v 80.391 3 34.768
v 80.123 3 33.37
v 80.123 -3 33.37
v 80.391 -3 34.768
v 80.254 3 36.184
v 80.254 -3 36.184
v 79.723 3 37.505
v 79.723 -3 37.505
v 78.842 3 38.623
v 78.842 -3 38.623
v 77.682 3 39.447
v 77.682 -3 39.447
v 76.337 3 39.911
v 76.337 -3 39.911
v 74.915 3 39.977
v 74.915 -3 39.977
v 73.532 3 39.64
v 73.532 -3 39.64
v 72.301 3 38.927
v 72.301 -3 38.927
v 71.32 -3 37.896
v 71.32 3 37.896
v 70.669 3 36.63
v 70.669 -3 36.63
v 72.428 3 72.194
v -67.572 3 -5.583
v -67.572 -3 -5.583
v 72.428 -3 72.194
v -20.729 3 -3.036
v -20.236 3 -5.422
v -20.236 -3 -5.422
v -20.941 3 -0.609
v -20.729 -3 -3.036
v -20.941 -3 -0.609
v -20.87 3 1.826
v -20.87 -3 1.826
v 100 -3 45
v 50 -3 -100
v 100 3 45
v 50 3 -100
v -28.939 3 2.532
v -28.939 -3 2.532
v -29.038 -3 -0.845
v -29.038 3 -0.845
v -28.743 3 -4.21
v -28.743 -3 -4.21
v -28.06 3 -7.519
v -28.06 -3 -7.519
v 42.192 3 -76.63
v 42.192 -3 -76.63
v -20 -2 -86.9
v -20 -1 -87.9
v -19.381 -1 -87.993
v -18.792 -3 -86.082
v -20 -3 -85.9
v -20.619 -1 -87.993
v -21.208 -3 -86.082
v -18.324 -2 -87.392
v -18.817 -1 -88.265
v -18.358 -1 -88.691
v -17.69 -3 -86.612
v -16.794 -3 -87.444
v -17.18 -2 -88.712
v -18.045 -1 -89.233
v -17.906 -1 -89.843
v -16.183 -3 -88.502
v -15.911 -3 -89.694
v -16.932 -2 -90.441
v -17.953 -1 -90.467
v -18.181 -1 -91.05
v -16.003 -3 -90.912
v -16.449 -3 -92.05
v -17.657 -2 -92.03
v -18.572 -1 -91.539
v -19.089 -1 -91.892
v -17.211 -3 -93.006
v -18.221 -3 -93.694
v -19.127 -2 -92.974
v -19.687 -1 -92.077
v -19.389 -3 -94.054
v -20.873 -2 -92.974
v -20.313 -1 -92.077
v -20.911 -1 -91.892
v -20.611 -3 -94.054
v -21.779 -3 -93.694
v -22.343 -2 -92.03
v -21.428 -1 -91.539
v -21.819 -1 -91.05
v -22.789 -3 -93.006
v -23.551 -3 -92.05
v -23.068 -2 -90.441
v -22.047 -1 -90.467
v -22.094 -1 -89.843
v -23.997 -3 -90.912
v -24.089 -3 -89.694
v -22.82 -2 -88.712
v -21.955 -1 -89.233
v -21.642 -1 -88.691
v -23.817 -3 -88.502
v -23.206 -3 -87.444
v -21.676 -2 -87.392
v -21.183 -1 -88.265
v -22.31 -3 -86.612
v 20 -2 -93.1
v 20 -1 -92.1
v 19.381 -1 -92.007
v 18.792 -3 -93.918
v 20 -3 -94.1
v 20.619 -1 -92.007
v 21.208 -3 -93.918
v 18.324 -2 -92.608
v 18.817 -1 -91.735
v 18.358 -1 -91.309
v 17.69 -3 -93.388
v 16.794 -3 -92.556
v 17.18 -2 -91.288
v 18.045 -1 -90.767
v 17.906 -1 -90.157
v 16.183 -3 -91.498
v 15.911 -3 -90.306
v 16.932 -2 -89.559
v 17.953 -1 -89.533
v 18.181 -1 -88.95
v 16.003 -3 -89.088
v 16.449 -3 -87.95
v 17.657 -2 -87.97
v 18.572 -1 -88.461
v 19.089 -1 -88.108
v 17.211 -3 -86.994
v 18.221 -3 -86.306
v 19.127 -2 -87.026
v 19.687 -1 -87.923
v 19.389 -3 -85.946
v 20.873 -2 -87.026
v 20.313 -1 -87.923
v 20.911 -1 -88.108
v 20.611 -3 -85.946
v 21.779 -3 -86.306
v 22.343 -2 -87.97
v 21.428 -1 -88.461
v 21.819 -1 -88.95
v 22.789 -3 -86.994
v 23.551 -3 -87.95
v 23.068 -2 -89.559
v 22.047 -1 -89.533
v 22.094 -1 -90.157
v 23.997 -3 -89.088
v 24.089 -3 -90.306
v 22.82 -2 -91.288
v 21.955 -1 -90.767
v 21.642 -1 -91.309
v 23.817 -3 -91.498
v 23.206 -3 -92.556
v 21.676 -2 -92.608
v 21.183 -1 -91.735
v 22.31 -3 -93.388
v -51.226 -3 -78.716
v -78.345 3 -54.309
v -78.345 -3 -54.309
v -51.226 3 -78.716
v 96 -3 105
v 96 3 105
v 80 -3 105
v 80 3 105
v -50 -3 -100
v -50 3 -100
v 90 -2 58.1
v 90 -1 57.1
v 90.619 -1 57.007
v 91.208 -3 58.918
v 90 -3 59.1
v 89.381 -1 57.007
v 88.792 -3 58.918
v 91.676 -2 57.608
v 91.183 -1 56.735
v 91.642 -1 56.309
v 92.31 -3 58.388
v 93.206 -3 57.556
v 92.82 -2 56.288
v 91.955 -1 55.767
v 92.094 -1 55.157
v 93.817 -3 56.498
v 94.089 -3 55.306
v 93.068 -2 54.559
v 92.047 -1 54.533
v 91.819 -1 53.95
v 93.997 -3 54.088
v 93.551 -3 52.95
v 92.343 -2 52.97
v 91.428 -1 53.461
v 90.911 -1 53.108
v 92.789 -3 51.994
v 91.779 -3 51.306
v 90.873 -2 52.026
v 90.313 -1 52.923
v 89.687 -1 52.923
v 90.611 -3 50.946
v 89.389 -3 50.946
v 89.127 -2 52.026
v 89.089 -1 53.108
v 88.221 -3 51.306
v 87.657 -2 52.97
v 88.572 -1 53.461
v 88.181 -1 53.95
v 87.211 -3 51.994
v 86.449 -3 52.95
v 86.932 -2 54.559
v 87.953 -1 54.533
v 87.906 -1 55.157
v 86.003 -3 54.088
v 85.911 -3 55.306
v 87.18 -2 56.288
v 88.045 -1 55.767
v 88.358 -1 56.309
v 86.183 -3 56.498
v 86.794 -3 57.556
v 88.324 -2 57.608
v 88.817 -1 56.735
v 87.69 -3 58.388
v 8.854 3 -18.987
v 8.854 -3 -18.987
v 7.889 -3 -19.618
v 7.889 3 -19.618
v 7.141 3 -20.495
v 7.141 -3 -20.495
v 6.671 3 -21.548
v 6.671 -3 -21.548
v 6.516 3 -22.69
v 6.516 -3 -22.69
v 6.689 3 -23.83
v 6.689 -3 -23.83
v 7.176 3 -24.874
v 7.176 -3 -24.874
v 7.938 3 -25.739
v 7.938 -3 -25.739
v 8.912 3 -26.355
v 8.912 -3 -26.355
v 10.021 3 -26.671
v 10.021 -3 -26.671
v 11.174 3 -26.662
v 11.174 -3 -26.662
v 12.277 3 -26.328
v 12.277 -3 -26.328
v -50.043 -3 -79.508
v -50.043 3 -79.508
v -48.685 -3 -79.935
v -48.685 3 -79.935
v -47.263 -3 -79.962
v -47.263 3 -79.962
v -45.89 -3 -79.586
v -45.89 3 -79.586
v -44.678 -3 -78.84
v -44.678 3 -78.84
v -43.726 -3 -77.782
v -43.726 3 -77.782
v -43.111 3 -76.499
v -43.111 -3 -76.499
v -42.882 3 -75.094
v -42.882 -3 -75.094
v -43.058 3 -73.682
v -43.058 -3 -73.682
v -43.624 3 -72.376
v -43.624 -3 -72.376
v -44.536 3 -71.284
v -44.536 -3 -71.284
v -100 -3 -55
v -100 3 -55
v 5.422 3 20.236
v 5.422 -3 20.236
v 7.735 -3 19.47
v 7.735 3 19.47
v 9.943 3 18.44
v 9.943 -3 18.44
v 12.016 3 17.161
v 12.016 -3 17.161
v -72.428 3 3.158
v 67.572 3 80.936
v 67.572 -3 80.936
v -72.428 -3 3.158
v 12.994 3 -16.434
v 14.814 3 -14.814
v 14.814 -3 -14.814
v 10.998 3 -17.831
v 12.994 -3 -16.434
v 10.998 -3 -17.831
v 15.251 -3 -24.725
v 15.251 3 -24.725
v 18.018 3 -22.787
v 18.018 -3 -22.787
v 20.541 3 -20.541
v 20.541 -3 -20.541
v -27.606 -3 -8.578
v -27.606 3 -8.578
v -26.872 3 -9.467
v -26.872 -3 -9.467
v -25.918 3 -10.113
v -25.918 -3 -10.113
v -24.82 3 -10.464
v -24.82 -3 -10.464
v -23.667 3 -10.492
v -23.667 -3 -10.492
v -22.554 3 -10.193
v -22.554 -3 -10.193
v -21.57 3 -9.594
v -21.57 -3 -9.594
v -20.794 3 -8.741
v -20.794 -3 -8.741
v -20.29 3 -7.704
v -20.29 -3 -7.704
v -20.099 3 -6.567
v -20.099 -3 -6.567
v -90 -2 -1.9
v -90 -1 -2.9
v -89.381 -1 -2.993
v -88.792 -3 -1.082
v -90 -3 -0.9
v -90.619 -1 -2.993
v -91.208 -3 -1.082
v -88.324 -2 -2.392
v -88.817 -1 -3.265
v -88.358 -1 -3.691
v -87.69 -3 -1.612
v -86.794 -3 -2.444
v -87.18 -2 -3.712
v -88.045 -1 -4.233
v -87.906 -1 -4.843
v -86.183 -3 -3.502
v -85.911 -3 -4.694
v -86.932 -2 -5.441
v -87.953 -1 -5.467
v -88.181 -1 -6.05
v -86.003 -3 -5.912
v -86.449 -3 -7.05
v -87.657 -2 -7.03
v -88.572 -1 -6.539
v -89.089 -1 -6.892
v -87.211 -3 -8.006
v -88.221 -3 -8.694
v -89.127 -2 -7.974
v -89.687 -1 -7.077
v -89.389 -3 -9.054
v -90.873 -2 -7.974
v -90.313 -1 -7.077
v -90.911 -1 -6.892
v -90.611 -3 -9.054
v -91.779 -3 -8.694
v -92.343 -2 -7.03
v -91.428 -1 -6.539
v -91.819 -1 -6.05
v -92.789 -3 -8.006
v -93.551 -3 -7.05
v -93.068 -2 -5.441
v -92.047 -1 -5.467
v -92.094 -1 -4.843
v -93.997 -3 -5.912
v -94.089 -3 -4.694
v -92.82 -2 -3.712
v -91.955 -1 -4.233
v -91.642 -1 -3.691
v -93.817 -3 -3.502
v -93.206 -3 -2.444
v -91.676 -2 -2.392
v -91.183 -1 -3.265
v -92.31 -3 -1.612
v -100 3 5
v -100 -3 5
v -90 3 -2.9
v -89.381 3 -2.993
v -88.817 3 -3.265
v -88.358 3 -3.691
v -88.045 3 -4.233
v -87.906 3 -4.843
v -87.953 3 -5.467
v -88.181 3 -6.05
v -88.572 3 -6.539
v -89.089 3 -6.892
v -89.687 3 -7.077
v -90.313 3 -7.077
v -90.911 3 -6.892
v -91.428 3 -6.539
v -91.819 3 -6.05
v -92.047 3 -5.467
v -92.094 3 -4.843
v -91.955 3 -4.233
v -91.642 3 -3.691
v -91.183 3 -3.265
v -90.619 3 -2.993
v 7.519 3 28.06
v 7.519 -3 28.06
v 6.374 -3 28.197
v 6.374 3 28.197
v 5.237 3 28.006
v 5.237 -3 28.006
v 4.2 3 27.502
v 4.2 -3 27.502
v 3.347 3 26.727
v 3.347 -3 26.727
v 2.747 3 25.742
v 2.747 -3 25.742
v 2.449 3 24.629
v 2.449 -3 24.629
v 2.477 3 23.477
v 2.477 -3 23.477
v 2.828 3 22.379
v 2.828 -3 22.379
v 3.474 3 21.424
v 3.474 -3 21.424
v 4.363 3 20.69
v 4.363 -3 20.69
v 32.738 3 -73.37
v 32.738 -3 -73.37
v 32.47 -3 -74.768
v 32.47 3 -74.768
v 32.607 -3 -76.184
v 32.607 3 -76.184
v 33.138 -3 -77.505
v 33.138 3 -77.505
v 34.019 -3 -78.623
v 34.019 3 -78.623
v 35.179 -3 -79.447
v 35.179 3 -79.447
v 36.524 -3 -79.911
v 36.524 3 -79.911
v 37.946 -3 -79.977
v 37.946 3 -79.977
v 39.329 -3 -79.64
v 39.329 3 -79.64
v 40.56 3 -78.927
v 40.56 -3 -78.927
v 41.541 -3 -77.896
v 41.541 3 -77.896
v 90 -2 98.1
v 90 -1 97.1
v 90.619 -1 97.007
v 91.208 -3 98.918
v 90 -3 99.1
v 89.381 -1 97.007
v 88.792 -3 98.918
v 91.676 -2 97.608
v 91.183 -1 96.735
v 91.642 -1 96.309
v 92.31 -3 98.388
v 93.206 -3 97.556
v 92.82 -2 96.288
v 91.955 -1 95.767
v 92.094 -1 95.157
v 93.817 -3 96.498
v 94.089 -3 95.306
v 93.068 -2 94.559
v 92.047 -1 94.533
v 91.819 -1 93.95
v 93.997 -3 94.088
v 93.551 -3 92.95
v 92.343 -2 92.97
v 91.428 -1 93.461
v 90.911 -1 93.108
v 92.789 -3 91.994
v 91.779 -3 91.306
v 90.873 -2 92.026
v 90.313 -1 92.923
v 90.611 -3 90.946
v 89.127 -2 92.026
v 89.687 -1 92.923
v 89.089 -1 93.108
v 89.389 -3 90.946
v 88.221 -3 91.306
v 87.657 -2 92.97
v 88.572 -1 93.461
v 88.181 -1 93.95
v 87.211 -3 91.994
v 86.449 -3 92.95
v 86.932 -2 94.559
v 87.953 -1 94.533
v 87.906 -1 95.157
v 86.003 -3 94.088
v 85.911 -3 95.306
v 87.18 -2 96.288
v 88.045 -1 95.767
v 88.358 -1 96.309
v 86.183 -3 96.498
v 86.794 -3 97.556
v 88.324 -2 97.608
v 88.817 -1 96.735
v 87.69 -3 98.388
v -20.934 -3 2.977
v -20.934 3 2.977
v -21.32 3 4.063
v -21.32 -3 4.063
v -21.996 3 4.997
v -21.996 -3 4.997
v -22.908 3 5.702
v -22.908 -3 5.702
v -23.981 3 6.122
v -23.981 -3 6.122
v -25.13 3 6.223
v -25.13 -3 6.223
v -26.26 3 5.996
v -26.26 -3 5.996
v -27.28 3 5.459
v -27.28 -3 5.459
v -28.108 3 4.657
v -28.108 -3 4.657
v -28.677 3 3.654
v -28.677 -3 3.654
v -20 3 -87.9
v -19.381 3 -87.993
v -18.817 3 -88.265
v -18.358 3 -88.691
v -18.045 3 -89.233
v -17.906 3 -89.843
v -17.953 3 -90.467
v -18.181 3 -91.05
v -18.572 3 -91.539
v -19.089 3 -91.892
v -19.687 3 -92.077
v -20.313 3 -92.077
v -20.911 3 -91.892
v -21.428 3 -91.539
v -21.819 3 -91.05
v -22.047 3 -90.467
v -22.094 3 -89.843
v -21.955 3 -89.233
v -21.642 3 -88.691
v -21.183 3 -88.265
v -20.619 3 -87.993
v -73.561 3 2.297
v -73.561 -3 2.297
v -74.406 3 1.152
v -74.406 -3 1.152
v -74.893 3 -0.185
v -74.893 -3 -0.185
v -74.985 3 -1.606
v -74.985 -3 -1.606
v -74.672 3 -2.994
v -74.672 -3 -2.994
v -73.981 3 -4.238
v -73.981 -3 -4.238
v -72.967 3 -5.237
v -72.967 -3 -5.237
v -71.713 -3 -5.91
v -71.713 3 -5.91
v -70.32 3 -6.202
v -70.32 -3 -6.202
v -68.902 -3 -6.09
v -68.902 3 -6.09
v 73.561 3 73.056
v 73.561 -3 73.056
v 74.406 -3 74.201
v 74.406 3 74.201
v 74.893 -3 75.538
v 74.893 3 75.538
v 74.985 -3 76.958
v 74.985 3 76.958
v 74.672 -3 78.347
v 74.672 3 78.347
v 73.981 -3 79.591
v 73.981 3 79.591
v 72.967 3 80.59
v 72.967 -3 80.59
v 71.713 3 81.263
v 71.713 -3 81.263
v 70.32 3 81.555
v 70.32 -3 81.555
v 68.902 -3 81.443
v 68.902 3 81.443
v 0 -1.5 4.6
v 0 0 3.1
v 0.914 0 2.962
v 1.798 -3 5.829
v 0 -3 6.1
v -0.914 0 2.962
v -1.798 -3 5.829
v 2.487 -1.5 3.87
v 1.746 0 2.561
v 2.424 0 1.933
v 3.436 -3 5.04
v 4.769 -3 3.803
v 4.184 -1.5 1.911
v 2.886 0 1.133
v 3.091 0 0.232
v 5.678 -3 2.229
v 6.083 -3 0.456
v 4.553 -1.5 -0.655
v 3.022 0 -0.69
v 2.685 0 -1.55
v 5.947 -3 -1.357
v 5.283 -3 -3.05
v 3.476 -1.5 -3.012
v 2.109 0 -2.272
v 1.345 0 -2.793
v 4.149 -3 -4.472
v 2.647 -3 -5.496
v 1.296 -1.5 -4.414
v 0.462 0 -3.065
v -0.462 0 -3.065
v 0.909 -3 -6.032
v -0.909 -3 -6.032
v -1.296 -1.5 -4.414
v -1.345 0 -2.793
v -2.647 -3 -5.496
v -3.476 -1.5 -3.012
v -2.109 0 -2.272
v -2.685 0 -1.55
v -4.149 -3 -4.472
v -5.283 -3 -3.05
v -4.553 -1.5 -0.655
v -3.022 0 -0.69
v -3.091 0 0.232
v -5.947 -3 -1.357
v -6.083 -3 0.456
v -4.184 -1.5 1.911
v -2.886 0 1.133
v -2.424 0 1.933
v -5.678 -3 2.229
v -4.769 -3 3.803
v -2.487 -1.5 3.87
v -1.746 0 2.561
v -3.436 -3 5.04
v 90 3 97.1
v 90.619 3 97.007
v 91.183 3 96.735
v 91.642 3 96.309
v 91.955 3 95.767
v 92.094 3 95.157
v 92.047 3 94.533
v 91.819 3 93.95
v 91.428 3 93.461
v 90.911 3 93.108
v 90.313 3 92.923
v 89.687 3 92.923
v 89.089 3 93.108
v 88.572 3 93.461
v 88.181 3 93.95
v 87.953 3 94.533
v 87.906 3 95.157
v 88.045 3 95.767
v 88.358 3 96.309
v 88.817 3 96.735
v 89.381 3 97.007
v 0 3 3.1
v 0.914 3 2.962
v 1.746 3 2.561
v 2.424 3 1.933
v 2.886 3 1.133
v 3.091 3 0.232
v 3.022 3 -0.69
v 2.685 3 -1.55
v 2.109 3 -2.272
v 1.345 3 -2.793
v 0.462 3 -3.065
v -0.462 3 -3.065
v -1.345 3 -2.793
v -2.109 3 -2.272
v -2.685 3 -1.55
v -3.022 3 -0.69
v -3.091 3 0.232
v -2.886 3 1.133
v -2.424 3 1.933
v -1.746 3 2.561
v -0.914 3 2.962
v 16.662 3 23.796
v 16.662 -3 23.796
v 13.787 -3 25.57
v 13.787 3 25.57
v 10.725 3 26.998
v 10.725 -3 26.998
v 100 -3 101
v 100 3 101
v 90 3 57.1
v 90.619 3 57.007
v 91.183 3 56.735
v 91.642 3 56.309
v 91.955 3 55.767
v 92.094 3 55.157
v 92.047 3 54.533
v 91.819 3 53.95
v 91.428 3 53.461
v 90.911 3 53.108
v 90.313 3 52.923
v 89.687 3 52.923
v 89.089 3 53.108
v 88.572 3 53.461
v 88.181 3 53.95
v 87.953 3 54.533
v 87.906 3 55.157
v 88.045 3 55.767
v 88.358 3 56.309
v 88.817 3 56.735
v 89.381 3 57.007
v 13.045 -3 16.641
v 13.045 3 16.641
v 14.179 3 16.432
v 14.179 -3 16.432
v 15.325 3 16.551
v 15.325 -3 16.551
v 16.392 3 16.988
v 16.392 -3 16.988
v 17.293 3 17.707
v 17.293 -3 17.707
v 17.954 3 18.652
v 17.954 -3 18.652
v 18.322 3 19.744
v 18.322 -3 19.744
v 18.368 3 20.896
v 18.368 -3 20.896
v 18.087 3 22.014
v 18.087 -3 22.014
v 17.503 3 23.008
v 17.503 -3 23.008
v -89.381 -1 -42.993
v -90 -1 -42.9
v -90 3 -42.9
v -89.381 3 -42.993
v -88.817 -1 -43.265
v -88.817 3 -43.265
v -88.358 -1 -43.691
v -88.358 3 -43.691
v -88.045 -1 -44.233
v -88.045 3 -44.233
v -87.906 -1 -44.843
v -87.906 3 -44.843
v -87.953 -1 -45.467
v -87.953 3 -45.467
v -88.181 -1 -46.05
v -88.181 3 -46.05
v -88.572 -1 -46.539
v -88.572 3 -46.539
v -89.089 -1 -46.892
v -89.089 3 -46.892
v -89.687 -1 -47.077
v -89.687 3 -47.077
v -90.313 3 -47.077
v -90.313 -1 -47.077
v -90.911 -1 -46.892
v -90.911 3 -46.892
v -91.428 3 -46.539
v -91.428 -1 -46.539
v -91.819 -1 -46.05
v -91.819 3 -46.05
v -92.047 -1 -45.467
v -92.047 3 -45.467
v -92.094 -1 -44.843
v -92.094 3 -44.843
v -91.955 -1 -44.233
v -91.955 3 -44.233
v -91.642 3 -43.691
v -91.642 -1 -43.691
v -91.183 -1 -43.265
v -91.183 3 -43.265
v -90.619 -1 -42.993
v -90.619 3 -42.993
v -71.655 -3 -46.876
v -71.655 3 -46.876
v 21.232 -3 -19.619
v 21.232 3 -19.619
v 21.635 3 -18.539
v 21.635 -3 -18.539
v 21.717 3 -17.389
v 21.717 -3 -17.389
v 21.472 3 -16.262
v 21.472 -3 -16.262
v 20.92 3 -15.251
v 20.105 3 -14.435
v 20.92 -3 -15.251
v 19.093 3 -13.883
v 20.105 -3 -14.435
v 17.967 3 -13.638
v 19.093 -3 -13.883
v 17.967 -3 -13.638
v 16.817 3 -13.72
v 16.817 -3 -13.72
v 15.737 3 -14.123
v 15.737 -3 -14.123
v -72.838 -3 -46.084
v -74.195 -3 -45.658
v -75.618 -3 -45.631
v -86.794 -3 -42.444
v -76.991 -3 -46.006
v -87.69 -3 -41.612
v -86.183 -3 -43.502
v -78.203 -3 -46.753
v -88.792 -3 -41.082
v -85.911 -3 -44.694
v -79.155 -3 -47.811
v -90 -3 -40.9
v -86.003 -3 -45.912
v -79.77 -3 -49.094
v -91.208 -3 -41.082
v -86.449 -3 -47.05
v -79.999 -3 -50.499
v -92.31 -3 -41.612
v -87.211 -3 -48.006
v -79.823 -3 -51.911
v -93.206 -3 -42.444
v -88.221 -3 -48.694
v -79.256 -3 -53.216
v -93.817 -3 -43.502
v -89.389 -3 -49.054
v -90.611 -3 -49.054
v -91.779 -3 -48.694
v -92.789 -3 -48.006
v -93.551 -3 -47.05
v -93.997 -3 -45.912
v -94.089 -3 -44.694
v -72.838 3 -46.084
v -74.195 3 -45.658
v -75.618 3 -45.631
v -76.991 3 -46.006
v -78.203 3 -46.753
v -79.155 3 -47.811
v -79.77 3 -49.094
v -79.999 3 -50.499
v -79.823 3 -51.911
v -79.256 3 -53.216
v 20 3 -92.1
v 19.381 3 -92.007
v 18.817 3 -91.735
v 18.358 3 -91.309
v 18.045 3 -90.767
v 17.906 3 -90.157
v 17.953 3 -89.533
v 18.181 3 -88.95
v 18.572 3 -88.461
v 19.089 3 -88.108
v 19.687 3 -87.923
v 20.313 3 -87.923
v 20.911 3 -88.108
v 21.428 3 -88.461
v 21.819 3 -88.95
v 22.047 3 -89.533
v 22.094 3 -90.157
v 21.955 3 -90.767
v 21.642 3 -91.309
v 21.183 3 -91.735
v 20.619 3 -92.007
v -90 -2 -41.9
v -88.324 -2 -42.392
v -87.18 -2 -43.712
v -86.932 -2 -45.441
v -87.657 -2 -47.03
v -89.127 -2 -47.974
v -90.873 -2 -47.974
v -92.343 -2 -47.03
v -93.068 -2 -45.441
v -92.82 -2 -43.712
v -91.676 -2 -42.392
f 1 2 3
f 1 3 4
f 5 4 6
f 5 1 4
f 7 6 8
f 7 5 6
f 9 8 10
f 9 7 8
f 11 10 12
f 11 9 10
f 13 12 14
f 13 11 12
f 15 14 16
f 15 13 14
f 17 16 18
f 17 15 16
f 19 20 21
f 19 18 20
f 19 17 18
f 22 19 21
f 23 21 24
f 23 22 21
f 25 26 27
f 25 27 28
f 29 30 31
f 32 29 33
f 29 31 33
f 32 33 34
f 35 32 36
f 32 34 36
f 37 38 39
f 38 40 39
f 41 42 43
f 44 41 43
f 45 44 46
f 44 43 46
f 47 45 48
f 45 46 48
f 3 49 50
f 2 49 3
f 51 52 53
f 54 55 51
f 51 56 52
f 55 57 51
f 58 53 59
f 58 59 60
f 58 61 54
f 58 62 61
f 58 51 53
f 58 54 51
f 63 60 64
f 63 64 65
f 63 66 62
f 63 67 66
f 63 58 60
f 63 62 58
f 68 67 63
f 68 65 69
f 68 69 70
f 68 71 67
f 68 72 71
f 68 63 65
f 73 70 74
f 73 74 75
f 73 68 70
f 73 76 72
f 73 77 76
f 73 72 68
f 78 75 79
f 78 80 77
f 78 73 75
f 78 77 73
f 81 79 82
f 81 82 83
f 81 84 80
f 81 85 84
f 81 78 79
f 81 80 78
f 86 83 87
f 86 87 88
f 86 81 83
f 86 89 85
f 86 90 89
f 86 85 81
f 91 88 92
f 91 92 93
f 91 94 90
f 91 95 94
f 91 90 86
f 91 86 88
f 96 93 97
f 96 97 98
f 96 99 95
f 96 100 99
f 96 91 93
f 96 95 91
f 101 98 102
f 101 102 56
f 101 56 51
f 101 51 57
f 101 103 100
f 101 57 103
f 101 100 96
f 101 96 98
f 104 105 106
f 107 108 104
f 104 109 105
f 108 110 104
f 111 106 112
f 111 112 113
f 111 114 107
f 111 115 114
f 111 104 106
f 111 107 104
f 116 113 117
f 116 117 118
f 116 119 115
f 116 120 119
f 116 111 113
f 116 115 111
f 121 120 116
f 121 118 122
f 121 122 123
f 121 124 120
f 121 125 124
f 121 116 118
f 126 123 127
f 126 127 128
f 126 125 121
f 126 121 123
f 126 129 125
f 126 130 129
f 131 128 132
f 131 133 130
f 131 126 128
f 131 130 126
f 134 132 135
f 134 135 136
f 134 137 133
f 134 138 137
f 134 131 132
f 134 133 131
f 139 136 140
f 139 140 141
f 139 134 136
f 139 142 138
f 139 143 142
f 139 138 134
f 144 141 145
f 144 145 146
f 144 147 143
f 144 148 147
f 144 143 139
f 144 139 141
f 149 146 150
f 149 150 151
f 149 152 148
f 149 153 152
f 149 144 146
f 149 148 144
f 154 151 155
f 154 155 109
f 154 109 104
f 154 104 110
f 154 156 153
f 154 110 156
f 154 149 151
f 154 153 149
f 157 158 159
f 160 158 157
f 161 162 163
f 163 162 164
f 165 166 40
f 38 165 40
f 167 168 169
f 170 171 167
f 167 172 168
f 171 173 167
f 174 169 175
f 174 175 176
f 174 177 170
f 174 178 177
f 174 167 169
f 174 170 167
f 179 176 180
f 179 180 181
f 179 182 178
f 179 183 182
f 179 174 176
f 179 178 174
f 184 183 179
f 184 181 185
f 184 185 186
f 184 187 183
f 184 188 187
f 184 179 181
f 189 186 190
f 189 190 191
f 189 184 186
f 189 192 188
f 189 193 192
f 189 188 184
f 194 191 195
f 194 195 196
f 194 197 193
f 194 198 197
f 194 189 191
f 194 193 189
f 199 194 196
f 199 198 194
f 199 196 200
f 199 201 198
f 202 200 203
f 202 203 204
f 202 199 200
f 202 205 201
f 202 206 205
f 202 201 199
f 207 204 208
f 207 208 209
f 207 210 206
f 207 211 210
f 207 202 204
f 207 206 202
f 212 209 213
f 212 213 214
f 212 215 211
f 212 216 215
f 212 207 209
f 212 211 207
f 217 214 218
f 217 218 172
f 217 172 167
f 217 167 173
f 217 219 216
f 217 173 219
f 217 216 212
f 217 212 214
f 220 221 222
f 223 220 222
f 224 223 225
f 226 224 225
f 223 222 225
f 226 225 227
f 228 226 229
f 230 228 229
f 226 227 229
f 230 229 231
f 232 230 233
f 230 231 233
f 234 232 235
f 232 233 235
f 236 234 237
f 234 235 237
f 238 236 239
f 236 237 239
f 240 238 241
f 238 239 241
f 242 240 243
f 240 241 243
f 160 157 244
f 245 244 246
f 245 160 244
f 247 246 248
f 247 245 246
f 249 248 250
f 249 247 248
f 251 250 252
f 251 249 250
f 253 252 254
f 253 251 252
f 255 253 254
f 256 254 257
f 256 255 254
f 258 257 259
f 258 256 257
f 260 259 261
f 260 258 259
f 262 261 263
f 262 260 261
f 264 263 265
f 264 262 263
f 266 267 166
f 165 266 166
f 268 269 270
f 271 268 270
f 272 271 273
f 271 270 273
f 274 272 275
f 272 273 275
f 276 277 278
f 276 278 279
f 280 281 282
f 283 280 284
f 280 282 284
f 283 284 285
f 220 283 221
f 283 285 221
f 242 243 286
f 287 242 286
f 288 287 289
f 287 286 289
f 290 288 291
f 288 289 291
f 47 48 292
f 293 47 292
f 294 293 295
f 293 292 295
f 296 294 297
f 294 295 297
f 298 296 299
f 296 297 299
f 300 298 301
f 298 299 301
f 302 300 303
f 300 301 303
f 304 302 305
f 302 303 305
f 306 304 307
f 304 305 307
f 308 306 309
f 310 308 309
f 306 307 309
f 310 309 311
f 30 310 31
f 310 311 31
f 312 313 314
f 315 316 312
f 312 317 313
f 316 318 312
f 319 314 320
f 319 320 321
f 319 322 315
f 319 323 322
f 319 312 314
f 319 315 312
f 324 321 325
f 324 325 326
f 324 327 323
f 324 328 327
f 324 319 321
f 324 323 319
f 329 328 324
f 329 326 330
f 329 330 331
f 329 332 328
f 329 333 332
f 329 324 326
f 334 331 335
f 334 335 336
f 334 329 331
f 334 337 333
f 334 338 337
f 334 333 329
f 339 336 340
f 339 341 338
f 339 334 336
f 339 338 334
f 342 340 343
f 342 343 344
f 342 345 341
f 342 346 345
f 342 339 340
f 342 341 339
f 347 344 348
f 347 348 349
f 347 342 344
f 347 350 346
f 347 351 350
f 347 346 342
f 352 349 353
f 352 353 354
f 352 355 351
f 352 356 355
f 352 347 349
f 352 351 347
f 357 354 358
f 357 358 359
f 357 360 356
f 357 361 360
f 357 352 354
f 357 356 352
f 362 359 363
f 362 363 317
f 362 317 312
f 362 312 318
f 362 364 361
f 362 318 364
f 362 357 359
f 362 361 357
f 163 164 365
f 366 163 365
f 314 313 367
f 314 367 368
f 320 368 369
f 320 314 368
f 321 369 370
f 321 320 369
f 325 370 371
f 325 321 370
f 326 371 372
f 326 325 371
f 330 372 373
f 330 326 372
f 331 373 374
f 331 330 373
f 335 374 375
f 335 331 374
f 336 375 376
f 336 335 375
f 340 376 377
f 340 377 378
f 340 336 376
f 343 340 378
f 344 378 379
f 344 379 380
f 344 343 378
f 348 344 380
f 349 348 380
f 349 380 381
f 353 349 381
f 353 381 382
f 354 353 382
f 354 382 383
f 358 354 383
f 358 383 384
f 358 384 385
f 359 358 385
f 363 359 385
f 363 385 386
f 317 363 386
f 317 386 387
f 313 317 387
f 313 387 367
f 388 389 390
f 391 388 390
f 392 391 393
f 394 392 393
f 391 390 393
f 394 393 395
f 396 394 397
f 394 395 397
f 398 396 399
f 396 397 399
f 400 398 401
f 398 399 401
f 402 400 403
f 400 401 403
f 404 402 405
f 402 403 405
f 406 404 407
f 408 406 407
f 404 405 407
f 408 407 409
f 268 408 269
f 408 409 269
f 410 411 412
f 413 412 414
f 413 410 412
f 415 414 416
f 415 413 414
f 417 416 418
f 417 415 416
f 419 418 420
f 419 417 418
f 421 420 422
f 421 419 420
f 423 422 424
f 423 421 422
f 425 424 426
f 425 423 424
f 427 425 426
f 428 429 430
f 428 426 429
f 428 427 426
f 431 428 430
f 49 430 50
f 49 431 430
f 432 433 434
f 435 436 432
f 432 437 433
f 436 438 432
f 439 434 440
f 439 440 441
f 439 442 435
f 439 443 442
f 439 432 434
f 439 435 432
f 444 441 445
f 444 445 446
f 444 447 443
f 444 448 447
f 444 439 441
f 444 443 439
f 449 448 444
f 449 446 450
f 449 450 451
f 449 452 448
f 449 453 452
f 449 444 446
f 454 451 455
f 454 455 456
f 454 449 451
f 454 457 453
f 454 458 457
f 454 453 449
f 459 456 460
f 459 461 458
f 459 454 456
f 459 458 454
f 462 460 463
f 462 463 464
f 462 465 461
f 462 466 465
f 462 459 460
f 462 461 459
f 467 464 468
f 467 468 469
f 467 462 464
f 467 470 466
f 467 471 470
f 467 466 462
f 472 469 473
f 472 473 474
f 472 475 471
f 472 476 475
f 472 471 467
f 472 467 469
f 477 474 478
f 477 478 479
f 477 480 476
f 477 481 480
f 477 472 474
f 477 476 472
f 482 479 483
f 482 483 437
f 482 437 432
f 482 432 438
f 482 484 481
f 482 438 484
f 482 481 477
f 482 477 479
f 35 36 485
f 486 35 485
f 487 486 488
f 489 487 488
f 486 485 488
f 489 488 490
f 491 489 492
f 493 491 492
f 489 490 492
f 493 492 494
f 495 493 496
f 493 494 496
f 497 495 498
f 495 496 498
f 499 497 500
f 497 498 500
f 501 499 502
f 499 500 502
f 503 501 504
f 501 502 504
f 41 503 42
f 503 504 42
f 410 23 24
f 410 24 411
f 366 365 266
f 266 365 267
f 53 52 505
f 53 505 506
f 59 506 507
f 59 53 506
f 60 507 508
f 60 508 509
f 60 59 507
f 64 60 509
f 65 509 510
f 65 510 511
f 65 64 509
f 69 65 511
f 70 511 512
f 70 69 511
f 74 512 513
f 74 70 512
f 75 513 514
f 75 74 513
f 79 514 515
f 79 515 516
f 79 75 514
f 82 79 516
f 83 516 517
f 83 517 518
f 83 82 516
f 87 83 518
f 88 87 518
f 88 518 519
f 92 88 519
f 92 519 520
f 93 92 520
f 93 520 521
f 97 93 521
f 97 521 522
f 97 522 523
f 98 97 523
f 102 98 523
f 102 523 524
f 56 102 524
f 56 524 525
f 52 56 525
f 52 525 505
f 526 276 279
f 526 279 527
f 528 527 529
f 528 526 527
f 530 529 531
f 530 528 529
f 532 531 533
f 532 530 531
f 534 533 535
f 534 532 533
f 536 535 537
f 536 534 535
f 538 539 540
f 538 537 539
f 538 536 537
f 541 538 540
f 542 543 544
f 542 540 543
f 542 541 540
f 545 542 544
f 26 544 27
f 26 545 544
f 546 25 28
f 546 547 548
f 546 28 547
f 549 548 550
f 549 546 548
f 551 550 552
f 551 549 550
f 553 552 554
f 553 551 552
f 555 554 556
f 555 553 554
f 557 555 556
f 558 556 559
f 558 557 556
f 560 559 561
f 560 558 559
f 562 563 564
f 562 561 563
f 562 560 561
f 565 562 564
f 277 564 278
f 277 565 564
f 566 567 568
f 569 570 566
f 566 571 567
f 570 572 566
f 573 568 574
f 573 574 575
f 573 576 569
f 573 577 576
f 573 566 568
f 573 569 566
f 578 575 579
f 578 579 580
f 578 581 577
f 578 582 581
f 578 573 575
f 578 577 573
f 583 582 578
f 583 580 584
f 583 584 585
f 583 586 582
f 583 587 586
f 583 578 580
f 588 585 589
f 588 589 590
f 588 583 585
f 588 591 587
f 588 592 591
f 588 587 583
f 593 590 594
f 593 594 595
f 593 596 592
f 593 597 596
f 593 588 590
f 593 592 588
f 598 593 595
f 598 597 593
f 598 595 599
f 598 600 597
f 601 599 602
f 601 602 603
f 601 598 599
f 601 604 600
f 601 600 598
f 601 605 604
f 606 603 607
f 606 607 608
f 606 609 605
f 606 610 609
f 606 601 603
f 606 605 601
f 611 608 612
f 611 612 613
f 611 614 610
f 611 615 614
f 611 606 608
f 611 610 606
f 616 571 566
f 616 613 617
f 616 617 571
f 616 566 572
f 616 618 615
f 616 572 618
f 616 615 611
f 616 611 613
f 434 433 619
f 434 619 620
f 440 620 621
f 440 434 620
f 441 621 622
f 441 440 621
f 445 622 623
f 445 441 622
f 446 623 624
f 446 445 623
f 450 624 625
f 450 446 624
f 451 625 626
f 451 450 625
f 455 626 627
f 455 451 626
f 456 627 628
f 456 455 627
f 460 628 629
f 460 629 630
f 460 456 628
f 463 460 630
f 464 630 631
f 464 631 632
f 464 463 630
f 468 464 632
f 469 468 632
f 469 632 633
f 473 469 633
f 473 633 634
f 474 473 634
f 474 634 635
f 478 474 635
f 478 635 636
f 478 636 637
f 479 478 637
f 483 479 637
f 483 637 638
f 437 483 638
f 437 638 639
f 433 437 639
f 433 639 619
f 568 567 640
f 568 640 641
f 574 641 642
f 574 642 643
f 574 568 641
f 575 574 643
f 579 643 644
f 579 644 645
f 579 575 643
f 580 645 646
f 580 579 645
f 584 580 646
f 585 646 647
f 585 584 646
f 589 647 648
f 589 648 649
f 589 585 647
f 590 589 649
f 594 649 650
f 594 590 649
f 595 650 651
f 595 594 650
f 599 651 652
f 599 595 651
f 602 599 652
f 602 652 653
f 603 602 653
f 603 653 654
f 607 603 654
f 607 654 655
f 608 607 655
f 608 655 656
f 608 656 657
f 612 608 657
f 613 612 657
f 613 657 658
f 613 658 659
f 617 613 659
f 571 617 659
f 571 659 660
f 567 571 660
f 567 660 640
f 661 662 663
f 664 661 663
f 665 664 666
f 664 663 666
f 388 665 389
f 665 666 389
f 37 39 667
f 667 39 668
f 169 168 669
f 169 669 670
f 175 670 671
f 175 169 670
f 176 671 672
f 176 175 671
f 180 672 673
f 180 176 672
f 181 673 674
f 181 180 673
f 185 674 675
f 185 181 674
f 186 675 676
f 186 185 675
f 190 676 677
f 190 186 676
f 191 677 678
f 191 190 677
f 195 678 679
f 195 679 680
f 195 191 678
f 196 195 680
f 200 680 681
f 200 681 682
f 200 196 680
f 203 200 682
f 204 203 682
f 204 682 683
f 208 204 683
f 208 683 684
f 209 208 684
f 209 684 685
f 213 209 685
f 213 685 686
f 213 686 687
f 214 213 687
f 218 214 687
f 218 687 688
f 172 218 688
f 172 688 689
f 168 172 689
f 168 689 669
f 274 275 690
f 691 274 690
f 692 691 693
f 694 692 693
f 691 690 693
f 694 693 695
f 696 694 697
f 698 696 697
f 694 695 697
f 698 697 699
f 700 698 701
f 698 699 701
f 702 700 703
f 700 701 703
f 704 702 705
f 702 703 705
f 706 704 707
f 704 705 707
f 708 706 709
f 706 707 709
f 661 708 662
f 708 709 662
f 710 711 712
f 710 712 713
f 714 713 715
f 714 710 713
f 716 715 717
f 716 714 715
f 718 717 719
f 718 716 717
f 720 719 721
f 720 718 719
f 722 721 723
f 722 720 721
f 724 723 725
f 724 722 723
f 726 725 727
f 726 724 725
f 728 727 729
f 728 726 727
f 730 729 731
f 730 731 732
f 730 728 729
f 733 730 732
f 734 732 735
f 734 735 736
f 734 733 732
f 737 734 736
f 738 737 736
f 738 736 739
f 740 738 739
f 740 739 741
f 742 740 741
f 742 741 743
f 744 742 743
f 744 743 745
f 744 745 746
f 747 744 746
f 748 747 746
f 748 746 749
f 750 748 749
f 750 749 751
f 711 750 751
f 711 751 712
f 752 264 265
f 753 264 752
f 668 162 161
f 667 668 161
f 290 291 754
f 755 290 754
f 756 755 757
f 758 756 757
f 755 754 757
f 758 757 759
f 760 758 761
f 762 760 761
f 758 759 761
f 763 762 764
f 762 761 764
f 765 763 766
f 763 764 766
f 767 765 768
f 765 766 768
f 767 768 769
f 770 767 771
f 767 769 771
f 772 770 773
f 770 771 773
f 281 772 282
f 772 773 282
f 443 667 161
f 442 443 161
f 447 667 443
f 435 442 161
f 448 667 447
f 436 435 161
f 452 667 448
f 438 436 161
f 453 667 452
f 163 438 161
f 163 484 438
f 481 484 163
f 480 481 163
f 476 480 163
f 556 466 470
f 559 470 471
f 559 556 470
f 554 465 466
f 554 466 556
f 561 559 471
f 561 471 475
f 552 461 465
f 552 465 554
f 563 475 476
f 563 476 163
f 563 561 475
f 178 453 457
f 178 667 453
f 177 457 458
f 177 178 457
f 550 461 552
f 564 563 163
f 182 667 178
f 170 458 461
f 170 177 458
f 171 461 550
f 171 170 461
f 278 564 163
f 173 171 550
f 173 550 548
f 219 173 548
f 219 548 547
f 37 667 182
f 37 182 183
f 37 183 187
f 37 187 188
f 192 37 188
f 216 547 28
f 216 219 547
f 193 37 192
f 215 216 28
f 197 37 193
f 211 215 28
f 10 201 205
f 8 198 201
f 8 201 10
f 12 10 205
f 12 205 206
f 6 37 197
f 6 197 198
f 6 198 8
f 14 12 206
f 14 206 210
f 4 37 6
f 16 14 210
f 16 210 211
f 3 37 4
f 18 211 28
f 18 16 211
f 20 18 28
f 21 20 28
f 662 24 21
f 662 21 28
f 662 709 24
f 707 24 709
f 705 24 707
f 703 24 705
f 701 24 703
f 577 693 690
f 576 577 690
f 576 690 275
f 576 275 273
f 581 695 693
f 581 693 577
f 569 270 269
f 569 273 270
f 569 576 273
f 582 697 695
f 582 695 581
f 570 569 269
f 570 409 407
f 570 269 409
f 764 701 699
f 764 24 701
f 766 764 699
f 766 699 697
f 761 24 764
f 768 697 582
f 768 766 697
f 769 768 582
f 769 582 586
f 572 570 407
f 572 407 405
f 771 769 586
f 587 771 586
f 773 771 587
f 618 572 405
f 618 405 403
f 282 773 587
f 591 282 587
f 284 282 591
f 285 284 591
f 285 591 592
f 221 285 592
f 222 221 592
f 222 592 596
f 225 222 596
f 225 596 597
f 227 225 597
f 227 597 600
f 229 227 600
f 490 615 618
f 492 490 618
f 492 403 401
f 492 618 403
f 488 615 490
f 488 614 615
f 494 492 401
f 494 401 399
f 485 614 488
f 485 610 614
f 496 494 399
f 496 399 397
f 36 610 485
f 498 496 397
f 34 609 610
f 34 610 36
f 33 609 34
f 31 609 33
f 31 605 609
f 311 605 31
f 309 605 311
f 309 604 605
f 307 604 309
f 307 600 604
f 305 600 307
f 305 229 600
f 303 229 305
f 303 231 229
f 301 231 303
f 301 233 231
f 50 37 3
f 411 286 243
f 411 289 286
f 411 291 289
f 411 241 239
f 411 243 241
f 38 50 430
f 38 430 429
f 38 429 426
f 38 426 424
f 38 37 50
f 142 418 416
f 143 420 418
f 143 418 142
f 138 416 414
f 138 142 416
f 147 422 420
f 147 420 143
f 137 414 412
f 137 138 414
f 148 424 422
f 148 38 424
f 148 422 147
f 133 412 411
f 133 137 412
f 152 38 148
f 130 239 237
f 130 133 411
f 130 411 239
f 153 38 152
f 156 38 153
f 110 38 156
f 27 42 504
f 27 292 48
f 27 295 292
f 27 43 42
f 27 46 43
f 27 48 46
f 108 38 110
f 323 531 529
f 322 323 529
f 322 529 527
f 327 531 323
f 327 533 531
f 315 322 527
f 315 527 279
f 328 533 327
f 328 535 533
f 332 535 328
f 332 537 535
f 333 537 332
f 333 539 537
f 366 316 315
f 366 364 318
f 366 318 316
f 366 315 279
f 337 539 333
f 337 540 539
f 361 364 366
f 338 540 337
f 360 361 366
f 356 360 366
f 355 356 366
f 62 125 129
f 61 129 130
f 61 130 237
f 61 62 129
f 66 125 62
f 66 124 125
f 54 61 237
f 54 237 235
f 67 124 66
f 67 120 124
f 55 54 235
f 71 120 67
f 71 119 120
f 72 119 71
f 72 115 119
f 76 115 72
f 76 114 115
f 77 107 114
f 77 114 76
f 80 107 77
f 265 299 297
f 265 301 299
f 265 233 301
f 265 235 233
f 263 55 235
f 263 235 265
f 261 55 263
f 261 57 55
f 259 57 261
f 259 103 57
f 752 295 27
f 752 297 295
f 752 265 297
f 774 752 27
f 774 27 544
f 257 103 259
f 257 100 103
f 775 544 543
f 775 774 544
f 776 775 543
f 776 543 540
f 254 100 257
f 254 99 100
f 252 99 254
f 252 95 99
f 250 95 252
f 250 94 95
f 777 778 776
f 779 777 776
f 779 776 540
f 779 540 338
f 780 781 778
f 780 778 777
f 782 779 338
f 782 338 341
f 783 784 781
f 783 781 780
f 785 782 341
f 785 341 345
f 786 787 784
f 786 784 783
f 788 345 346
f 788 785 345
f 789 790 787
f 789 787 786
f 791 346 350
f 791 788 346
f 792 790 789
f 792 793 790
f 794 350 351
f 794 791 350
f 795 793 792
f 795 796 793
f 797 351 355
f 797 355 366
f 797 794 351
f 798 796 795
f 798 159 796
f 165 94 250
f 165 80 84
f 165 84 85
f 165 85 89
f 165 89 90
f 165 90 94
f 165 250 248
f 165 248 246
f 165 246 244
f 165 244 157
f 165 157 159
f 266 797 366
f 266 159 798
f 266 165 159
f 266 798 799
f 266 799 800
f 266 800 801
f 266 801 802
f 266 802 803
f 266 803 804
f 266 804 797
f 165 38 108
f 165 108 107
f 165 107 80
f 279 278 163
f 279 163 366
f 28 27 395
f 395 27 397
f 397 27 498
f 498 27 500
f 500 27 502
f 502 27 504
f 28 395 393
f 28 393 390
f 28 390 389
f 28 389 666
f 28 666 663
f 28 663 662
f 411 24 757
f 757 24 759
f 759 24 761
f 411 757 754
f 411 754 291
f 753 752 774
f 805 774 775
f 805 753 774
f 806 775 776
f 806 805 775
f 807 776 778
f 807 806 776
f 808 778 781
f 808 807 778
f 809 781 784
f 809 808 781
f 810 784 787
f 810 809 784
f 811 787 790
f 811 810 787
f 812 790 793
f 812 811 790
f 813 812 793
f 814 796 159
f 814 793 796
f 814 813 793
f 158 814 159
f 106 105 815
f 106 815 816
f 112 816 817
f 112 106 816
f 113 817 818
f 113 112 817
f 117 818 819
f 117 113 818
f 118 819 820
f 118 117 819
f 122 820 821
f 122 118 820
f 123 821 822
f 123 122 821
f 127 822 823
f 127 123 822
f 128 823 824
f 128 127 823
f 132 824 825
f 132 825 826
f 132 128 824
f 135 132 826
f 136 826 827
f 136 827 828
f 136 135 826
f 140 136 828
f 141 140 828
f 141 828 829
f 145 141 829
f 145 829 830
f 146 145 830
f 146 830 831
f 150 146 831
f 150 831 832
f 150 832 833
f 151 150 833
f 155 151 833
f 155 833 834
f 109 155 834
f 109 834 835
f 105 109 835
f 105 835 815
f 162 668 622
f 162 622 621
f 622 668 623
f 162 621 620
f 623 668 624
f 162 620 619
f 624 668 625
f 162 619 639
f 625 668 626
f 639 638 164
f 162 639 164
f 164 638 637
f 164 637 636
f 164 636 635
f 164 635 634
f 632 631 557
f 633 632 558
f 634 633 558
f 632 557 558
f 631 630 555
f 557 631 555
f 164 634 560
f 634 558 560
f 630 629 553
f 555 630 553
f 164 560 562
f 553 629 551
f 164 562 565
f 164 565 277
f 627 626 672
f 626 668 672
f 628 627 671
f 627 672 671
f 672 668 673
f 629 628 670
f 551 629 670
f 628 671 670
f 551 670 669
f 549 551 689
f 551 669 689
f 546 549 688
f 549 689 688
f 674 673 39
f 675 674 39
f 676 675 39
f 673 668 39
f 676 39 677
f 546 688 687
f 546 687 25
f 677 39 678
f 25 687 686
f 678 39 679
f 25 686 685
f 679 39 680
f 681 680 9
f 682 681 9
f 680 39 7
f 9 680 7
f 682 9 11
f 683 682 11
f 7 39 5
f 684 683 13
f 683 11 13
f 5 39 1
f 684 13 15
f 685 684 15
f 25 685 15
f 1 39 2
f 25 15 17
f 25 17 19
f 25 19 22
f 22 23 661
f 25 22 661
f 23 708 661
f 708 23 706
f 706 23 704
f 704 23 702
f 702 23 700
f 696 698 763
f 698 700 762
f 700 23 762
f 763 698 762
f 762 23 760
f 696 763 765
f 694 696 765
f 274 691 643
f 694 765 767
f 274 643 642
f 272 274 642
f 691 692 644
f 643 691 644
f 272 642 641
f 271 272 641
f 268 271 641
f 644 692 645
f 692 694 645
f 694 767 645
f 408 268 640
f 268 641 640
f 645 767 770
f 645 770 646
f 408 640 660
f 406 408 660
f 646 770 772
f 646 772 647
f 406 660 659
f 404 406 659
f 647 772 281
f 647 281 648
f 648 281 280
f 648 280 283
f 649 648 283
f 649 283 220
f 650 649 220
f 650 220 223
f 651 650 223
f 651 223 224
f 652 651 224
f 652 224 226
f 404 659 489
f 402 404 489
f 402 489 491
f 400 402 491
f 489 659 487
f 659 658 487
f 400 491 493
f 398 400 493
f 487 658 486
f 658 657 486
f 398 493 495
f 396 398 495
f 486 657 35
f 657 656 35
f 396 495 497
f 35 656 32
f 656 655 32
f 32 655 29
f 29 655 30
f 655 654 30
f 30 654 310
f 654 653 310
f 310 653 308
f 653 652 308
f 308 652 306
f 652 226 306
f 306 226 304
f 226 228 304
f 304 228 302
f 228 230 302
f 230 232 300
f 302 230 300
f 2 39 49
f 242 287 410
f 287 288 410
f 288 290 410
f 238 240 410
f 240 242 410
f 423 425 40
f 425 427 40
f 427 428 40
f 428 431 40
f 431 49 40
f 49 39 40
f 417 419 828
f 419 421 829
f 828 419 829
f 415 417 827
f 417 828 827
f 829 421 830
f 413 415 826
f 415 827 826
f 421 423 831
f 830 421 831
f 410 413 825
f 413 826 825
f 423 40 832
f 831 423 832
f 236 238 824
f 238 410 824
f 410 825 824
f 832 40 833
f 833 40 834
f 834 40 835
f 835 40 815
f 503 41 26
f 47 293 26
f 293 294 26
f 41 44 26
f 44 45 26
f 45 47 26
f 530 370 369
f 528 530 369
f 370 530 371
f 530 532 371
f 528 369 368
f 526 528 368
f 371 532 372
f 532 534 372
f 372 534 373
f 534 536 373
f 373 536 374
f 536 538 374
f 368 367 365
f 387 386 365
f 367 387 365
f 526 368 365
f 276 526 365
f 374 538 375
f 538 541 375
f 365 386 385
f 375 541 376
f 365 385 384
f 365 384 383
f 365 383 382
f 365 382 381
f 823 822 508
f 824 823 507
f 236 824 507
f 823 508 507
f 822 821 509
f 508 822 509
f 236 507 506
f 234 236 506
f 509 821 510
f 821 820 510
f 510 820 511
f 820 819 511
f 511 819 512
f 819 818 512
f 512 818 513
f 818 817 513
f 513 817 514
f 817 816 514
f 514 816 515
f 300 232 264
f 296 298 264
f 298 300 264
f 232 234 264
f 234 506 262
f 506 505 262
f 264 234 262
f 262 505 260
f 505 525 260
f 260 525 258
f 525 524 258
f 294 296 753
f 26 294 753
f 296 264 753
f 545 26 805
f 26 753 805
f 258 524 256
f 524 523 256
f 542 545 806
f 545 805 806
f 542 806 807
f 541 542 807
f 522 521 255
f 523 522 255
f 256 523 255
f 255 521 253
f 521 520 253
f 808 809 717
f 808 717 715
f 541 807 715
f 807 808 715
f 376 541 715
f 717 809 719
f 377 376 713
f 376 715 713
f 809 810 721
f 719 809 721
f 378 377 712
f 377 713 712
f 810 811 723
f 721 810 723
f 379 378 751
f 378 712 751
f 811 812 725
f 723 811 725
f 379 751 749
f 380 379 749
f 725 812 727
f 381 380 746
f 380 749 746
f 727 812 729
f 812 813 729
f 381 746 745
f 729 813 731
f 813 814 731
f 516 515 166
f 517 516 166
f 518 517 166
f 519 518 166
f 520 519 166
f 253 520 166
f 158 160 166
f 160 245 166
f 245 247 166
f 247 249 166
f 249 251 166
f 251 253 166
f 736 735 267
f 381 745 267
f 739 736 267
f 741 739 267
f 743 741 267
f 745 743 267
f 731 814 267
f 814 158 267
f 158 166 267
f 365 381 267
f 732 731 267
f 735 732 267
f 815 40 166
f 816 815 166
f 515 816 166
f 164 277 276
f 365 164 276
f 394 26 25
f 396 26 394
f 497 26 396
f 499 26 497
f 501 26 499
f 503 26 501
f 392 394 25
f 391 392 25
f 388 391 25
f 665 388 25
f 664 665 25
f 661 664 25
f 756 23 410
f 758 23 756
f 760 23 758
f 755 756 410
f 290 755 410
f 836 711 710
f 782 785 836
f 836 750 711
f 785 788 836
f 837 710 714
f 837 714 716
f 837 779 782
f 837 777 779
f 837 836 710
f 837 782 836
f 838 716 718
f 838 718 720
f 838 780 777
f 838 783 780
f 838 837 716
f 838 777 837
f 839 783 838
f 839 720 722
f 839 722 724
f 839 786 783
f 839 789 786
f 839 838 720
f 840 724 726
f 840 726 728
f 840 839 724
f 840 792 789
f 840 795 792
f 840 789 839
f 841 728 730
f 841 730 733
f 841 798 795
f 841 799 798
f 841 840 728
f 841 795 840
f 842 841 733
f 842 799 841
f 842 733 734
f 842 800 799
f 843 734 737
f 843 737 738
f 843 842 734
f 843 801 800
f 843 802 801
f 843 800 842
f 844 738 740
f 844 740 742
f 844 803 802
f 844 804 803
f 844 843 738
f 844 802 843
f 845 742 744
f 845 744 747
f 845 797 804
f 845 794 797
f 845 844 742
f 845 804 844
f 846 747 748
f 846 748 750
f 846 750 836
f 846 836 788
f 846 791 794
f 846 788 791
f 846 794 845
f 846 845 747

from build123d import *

# Parameters (mm, degrees)
SKETCH_1_R               = 3.1
SKETCH_1_R_2             = 2.1
EXTRUDE_1_DEPTH          = 3
CHAMFER_1_SIZE           = 2
CHAMFER_3_SIZE           = 4
CUT_EXTRUDE_1_DEPTH      = 146.124084838
CHAMFER_4_SIZE           = 3
CUT_EXTRUDE_2_DEPTH      = 146.124084838
PATTERN_CIRCULAR_1_COUNT = 3


with BuildPart() as part:
    # 草图1 → 凸台-拉伸1 (new, symmetric)
    with BuildSketch(Plane(origin=(0, 0, 0), x_dir=(1, 0, 0), z_dir=(0, 1, 0))):
        Polygon((-50, 100), (50, 100), (100, -45), (100, -105), (80, -105), (-100, -5), (-100, 55), align=None)
        with Locations(Location((0, 0, 0), (0, 0, 270))):
            Circle(SKETCH_1_R, mode=Mode.SUBTRACT)
        with Locations(Location((-20, 90, 0), (0, 0, 270))):
            Circle(SKETCH_1_R_2, mode=Mode.SUBTRACT)
        with Locations(Location((-90, 45, 0), (0, 0, 270))):
            Circle(SKETCH_1_R_2, mode=Mode.SUBTRACT)
        with Locations(Location((-90, 5, 0), (0, 0, 270))):
            Circle(SKETCH_1_R_2, mode=Mode.SUBTRACT)
        with Locations(Location((20, 90, 0), (0, 0, 90))):
            Circle(SKETCH_1_R_2, mode=Mode.SUBTRACT)
        with Locations(Location((90, -55, 0), (0, 0, 270))):
            Circle(SKETCH_1_R_2, mode=Mode.SUBTRACT)
        with Locations(Location((90, -95, 0), (0, 0, 270))):
            Circle(SKETCH_1_R_2, mode=Mode.SUBTRACT)
    extrude(amount=EXTRUDE_1_DEPTH, both=True)

    # 倒角1
    chamfer_1_edges = [part.edges().sort_by_distance(p)[0] for p in [
        (-20, -3, -92.1),
        (-90, -3, -47.1),
        (-90, -3, -7.1),
        (90, -3, 52.9),
        (90, -3, 92.9),
        (20, -3, -87.9),
    ]]
    chamfer(chamfer_1_edges, length=CHAMFER_1_SIZE)

    # 倒角3
    chamfer_3_edges = [part.edges().sort_by_distance(p)[0] for p in [
        (100, 0, 105),
    ]]
    chamfer(chamfer_3_edges, length=CHAMFER_3_SIZE)

    # 草图2 → 切除-拉伸1 (cut, through all)
    with BuildSketch(Plane(origin=(0, 3, 0), x_dir=(1, 0, 0), z_dir=(0, 1, 0))):
        with BuildLine():
            Line((-78.344823658, 54.309222637), (-51.225659109, 78.716470731))
            ThreePointArc((-51.225659109, 78.716470731), (-44.16436472, 78.344823658), (-44.536011793, 71.283529269))
            Line((-44.536011793, 71.283529269), (-71.655176342, 46.876281175))
            ThreePointArc((-71.655176342, 46.876281175), (-78.716470731, 47.247928248), (-78.344823658, 54.309222637))
        make_face()
        with BuildLine():
            Line((70.669187988, -36.629953417), (32.738153505, 73.370046583))
            ThreePointArc((32.738153505, 73.370046583), (35.835064997, 79.726864908), (42.191883322, 76.629953417))
            Line((42.191883322, 76.629953417), (80.122917804, -33.370046583))
            ThreePointArc((80.122917804, -33.370046583), (77.026006313, -39.726864908), (70.669187988, -36.629953417))
        make_face()
        with BuildLine():
            Line((67.571785344, -80.936052734), (-72.428214656, -3.158274956))
            ThreePointArc((-72.428214656, -3.158274956), (-74.370786381, 3.64072608), (-67.571785344, 5.583297805))
            Line((-67.571785344, 5.583297805), (72.428214656, -72.194479973))
            ThreePointArc((72.428214656, -72.194479973), (74.370786381, -78.993481009), (67.571785344, -80.936052734))
        make_face()
    extrude(amount=-CUT_EXTRUDE_1_DEPTH, mode=Mode.SUBTRACT)

    # 倒角4
    chamfer_4_edges = [part.edges().sort_by_distance(p)[0] for p in [
        (0, -3, -3.1),
    ]]
    chamfer(chamfer_4_edges, length=CHAMFER_4_SIZE)

    # 草图3 → 切除-拉伸2 (cut, through all)
    with BuildSketch(Plane.XZ.offset(3)):
        with BuildLine():
            ThreePointArc((12.277060504, -26.328241213), (16.662395476, -23.796366887), (20.541451993, -20.541451993))
            ThreePointArc((20.541451993, -20.541451993), (20.541451993, -14.813887066), (14.813887066, -14.813887066))
            ThreePointArc((14.813887066, -14.813887066), (12.016426342, -17.161235328), (8.853852583, -18.987148138))
            ThreePointArc((8.853852583, -18.987148138), (6.894910006, -24.369298636), (12.277060504, -26.328241213))
        make_face()
    cut_extrude_2 = extrude(amount=-CUT_EXTRUDE_2_DEPTH, mode=Mode.SUBTRACT)

    # 阵列(圆周)1: 切除-拉伸2 ×3 about axis
    pattern_circular_1_axis = Axis((0, 0, 0), (0, 1, 0))
    for i in range(1, PATTERN_CIRCULAR_1_COUNT):
        add(cut_extrude_2.rotate(pattern_circular_1_axis, i * 360 / PATTERN_CIRCULAR_1_COUNT), mode=Mode.SUBTRACT)


solid = part.part
